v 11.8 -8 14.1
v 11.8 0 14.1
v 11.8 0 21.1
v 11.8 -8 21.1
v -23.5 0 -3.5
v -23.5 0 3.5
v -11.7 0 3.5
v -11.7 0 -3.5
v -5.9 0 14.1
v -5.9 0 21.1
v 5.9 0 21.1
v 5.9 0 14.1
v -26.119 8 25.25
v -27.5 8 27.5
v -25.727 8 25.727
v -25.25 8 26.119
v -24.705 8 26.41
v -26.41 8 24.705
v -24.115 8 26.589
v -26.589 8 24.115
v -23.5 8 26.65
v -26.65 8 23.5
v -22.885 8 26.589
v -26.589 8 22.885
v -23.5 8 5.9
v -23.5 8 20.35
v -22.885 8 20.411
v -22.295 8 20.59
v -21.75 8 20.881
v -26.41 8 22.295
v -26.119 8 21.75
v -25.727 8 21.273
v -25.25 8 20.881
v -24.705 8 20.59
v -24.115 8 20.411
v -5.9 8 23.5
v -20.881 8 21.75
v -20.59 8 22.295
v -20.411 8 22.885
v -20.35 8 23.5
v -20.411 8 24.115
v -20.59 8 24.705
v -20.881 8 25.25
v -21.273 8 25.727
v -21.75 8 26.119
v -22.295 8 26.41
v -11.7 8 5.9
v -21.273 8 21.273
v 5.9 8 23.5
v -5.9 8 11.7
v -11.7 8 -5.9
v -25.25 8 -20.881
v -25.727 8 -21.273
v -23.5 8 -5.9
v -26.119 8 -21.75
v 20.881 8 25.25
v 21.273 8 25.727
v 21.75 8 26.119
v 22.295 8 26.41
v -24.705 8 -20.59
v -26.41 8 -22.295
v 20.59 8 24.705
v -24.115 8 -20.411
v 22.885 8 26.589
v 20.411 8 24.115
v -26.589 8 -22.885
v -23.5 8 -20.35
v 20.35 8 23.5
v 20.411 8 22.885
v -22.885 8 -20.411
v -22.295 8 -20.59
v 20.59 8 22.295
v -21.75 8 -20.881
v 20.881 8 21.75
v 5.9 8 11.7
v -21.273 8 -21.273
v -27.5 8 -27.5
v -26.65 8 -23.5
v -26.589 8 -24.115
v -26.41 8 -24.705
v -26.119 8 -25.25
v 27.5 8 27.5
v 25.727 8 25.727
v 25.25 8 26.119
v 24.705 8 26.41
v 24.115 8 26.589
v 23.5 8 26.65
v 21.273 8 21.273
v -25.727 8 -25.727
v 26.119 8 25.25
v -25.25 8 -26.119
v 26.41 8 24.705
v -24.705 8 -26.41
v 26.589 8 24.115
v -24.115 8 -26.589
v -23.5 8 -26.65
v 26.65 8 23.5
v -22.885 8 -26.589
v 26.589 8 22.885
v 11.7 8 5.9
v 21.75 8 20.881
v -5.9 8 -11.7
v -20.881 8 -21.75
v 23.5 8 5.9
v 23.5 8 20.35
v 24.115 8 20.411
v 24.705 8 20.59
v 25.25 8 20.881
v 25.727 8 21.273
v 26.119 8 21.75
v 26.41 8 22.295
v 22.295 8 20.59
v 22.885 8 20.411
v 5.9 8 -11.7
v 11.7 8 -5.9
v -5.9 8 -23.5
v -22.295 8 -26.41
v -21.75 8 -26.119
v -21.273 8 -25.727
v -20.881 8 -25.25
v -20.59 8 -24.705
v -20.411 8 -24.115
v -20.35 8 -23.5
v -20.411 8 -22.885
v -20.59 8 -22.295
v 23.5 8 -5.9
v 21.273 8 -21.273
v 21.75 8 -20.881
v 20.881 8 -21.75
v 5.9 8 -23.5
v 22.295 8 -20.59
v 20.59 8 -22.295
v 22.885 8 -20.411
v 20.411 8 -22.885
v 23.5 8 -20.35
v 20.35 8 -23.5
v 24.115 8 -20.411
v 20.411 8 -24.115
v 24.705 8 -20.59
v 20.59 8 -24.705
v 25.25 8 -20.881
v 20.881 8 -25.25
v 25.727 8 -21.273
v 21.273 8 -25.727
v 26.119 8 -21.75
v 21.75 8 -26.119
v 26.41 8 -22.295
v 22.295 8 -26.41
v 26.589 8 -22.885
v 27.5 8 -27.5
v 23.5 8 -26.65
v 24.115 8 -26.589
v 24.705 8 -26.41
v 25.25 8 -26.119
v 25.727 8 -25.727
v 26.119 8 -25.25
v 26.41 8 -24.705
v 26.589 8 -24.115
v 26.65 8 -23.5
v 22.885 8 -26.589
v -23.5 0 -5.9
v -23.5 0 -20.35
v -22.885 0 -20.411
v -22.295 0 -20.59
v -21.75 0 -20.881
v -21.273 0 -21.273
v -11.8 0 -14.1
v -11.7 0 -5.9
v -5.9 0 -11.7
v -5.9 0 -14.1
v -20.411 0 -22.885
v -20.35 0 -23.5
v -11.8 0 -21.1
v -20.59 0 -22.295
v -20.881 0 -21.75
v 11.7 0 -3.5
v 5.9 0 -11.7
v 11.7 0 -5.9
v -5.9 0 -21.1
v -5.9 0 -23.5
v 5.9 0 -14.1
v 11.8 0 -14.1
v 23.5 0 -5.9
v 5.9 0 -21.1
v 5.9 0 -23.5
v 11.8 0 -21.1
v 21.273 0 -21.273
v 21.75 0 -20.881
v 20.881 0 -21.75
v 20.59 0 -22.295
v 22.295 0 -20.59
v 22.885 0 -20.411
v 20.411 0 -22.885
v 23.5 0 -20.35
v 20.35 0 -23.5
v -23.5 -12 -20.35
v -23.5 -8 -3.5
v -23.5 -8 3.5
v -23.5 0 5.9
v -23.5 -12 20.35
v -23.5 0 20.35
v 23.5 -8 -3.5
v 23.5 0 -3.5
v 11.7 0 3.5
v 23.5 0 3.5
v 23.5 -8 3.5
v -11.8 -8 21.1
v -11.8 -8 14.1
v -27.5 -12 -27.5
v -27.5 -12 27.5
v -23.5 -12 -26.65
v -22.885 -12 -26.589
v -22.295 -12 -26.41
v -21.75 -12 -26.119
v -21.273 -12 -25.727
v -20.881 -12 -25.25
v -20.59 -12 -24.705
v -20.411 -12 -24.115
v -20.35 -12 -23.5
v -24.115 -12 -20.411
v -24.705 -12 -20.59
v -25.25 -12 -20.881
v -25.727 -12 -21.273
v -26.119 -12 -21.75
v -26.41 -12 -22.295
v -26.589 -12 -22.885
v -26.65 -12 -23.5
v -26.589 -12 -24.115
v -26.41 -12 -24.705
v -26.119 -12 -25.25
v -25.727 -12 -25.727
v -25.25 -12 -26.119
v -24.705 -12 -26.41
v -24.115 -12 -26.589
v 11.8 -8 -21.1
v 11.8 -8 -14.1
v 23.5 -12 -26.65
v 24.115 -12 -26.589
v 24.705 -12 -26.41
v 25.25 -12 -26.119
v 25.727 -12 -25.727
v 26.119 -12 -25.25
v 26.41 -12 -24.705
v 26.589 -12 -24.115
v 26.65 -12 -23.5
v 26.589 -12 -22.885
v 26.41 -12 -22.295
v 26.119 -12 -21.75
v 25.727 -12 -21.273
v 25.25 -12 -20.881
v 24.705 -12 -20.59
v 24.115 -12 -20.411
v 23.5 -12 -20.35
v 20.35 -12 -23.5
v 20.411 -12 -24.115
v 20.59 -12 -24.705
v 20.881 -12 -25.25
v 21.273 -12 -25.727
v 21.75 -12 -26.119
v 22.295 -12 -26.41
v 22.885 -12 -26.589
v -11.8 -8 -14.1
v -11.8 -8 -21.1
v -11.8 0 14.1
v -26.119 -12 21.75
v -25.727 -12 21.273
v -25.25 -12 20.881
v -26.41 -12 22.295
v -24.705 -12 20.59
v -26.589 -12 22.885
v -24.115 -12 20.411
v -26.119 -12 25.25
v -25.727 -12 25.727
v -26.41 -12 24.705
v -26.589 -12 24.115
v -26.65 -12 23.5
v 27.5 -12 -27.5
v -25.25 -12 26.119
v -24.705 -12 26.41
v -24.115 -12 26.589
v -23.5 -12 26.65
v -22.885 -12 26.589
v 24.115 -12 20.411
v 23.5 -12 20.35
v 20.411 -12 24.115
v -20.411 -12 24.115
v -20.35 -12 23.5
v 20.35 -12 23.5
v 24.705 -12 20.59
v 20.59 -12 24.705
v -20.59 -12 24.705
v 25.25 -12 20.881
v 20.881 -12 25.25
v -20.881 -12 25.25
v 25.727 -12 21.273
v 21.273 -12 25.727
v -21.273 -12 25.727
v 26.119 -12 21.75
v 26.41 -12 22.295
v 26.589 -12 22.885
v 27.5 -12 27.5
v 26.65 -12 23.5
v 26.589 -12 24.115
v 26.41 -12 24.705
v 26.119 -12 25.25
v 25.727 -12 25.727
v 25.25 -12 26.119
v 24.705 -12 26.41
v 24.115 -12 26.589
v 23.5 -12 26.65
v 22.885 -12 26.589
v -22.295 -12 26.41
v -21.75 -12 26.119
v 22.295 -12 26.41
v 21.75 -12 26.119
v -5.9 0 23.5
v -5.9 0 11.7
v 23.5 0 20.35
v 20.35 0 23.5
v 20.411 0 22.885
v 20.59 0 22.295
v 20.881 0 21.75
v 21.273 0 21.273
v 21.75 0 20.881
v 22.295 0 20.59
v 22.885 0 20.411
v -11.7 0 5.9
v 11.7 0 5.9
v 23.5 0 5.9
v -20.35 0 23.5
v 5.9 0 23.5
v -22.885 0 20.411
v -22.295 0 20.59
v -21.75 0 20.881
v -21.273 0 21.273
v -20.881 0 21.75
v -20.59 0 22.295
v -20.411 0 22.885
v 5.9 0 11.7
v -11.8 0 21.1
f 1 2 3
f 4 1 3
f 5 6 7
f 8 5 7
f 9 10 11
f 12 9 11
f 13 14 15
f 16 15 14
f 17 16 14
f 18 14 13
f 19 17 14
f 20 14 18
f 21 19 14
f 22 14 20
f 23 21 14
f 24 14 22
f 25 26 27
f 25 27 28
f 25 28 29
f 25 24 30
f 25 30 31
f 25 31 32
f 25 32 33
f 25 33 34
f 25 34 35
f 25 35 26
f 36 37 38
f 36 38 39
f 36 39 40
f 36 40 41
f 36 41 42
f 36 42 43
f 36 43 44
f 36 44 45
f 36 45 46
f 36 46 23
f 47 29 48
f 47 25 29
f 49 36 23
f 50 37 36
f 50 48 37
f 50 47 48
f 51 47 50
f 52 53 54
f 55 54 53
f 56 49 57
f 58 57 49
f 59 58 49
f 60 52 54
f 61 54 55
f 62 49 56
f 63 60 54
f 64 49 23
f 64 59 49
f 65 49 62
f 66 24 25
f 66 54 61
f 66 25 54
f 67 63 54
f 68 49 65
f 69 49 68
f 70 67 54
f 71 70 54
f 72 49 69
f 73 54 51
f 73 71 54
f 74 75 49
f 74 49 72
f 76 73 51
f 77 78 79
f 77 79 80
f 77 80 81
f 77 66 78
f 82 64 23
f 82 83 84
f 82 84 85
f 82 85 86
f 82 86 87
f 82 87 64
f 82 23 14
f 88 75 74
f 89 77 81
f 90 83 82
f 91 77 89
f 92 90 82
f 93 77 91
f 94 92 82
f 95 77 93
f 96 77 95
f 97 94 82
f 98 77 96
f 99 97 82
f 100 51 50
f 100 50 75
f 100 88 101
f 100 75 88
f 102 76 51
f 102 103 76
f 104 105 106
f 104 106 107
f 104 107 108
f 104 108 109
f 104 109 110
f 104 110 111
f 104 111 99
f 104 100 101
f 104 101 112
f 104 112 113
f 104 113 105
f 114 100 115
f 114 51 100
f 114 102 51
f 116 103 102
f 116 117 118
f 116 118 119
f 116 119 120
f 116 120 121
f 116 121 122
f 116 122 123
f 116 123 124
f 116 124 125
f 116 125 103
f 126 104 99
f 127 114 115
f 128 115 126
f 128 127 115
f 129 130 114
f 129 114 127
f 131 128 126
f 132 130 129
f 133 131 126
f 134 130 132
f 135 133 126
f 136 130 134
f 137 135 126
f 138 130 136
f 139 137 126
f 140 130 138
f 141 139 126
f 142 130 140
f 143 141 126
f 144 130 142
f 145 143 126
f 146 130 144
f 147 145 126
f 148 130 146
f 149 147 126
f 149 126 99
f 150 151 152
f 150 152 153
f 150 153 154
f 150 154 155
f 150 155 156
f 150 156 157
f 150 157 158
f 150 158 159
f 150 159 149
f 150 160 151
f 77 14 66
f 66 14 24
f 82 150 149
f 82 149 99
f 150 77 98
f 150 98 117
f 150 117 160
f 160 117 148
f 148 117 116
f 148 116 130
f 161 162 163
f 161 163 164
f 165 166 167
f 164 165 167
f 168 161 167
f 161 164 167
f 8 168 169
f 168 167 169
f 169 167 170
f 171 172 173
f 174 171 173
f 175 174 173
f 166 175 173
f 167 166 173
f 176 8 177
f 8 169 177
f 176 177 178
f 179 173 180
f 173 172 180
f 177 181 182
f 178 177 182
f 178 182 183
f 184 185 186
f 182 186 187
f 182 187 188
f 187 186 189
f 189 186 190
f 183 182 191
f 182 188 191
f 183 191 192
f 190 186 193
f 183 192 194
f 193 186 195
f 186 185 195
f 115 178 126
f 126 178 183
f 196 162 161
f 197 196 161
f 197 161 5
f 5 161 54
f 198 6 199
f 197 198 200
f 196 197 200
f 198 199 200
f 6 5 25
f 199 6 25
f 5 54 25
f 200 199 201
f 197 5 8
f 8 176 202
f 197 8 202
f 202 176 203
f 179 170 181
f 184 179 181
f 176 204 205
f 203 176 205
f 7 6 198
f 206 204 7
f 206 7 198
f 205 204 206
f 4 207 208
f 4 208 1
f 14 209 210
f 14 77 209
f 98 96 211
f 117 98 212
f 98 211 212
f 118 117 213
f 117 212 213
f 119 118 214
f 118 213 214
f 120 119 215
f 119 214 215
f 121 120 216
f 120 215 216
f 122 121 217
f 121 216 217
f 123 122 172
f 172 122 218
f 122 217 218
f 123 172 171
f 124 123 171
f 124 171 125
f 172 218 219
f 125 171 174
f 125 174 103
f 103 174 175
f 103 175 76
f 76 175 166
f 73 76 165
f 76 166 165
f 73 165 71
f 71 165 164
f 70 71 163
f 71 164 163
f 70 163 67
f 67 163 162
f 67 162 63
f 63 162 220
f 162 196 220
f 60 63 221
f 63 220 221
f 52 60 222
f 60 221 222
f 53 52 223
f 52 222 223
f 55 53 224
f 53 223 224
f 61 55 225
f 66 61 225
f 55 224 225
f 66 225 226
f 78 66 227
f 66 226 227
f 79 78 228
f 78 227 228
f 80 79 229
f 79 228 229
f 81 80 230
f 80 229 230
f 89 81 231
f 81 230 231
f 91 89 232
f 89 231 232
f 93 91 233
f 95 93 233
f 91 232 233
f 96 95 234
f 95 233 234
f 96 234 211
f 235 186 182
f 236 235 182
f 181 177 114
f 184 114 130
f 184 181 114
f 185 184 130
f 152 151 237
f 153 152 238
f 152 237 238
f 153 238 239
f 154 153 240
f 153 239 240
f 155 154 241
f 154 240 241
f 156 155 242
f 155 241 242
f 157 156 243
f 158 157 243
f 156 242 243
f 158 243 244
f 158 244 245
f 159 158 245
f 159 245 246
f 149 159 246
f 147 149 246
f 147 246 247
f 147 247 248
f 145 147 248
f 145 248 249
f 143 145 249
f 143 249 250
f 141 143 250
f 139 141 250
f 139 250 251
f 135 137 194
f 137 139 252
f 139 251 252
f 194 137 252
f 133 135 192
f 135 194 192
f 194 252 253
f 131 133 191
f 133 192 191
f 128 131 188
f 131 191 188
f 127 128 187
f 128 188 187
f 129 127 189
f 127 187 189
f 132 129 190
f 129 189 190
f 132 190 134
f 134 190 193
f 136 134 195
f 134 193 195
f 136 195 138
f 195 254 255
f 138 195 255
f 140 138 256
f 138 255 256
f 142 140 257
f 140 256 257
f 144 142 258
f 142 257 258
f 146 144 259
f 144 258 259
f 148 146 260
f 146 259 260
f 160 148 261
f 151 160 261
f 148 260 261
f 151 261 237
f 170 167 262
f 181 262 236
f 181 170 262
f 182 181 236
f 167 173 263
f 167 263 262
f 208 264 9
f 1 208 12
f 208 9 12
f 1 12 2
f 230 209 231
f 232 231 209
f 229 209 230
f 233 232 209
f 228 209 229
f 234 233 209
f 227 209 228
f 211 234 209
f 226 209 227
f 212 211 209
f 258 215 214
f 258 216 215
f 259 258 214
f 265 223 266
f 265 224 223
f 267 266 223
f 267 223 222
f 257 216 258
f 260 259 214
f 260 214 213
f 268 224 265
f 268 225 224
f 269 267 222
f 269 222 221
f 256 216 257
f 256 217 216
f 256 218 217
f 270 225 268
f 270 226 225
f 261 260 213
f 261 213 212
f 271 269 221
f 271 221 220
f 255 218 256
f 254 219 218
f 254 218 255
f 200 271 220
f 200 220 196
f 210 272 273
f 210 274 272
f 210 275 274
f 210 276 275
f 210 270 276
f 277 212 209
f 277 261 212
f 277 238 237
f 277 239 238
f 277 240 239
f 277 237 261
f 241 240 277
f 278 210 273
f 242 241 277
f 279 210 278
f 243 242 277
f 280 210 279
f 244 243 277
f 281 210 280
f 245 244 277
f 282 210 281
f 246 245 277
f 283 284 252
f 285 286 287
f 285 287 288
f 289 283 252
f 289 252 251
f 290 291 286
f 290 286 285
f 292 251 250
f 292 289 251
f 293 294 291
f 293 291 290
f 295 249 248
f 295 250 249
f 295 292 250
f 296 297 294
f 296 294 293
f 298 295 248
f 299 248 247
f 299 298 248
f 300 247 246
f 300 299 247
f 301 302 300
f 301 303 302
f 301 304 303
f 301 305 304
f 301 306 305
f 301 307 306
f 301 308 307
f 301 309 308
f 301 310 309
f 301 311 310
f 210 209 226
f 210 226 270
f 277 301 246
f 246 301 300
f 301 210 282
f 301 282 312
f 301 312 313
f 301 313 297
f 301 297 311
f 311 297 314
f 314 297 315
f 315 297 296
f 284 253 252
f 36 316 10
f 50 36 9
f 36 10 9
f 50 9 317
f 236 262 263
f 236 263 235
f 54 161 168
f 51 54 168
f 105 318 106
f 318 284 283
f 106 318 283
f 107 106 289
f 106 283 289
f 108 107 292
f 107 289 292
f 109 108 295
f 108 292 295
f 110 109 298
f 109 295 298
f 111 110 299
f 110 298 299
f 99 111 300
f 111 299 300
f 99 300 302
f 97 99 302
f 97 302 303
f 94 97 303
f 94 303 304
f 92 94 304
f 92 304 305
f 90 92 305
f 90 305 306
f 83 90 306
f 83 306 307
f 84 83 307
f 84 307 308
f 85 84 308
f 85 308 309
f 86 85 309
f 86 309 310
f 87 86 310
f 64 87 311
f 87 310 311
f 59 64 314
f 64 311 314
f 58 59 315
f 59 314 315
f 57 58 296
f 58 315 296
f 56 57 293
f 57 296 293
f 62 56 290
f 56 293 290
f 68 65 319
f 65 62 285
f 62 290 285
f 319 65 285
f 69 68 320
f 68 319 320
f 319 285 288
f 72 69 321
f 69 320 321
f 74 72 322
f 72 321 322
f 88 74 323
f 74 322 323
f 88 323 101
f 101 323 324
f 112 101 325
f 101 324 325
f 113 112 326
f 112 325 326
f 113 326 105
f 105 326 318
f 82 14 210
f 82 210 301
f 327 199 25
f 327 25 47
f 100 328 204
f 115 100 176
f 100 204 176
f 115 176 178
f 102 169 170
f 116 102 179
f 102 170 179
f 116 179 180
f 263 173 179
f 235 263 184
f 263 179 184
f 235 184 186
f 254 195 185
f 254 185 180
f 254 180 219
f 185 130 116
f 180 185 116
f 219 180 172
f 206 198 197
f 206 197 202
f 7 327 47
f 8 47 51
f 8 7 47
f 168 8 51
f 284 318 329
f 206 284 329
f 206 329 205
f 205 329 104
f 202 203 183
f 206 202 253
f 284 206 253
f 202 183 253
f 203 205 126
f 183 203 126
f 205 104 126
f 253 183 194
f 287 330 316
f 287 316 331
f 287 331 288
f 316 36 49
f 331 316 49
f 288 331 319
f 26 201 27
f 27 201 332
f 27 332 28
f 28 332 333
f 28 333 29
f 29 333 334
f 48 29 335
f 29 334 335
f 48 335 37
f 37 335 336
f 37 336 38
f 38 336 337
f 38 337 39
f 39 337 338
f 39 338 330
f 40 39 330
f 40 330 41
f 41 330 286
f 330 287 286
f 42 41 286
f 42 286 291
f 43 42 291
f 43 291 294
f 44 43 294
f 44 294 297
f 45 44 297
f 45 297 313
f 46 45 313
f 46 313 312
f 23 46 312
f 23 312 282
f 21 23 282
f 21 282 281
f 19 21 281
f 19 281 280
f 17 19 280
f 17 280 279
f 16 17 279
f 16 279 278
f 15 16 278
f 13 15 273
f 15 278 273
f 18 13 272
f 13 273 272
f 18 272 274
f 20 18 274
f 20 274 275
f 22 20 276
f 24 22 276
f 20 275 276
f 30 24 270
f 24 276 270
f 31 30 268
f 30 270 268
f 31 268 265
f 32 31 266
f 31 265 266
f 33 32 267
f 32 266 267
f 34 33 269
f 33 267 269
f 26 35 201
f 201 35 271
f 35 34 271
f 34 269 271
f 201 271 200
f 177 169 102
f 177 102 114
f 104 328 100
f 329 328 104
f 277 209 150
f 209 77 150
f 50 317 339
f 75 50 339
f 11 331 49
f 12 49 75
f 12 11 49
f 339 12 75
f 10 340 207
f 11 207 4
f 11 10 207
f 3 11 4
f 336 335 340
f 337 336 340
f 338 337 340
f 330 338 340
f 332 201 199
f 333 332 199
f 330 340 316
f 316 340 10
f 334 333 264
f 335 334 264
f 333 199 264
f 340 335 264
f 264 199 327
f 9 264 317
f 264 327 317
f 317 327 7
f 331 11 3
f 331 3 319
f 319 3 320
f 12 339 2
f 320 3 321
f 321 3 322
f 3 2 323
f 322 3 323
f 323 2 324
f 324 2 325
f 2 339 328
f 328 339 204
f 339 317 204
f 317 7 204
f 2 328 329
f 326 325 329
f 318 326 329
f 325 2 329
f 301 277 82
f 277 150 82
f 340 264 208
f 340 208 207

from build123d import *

# Parameters (mm, degrees)
SKETCH1_W           = 55
SKETCH1_H           = 55
SKETCH1_W_2         = 11.8
SKETCH1_H_2         = 11.8
BOSS_EXTRUDE1_DEPTH = 8
SKETCH2_W           = 55
SKETCH2_H           = 55
BOSS_EXTRUDE7_DEPTH = 12
SKETCH2_5_W         = 23.6
SKETCH2_5_H         = 7
SKETCH2_5_W_2       = 47
BOSS_EXTRUDE8_DEPTH = 8
SKETCH6_R           = 3.15
CUT_EXTRUDE1_DEPTH  = 44.732139211


with BuildPart() as part:
    # Sketch1 → Boss-Extrude1 (new body)
    with BuildSketch(Plane(origin=(0, 0, 0), x_dir=(1, 0, 0), z_dir=(0, 1, 0))):
        Rectangle(SKETCH1_W, SKETCH1_H)
        with Locations((0, 17.6)):
            Rectangle(SKETCH1_W_2, SKETCH1_H_2, mode=Mode.SUBTRACT)
        with Locations((17.6, 0)):
            Rectangle(SKETCH1_W_2, SKETCH1_H_2, mode=Mode.SUBTRACT)
        with Locations((-17.6, 0)):
            Rectangle(SKETCH1_W_2, SKETCH1_H_2, mode=Mode.SUBTRACT)
        with Locations((0, -17.6)):
            Rectangle(SKETCH1_W_2, SKETCH1_H_2, mode=Mode.SUBTRACT)
    extrude(amount=BOSS_EXTRUDE1_DEPTH)

    # Sketch2 → Boss-Extrude7 (add)
    with BuildSketch(Plane.XZ):
        Rectangle(SKETCH2_W, SKETCH2_H)
        Polygon((-23.5, 23.5), (-5.9, 23.5), (5.9, 23.5), (23.5, 23.5), (23.5, 5.9), (23.5, 3.5), (23.5, -3.5), (23.5, -5.9), (23.5, -23.5), (5.9, -23.5), (-5.9, -23.5), (-23.5, -23.5), (-23.5, -5.9), (-23.5, -3.5), (-23.5, 3.5), (-23.5, 5.9), align=None, mode=Mode.SUBTRACT)
    extrude(amount=BOSS_EXTRUDE7_DEPTH)

    # Sketch2<5> → Boss-Extrude8 (add)
    with BuildSketch(Plane.XZ):
        with Locations((0, 17.6)):
            Rectangle(SKETCH2_5_W, SKETCH2_5_H)
        Rectangle(SKETCH2_5_W_2, SKETCH2_5_H)
        with Locations((0, -17.6)):
            Rectangle(SKETCH2_5_W, SKETCH2_5_H)
    extrude(amount=BOSS_EXTRUDE8_DEPTH)

    # Sketch6 → Cut-Extrude1 (cut, through all)
    with BuildSketch(Plane.XZ.offset(12)):
        with Locations((-23.5, 23.5)):
            Circle(SKETCH6_R)
        with Locations((23.5, 23.5)):
            Circle(SKETCH6_R)
        with Locations((-23.5, -23.5)):
            Circle(SKETCH6_R)
        with Locations((23.5, -23.5)):
            Circle(SKETCH6_R)
    extrude(amount=-CUT_EXTRUDE1_DEPTH, mode=Mode.SUBTRACT)


solid = part.part
